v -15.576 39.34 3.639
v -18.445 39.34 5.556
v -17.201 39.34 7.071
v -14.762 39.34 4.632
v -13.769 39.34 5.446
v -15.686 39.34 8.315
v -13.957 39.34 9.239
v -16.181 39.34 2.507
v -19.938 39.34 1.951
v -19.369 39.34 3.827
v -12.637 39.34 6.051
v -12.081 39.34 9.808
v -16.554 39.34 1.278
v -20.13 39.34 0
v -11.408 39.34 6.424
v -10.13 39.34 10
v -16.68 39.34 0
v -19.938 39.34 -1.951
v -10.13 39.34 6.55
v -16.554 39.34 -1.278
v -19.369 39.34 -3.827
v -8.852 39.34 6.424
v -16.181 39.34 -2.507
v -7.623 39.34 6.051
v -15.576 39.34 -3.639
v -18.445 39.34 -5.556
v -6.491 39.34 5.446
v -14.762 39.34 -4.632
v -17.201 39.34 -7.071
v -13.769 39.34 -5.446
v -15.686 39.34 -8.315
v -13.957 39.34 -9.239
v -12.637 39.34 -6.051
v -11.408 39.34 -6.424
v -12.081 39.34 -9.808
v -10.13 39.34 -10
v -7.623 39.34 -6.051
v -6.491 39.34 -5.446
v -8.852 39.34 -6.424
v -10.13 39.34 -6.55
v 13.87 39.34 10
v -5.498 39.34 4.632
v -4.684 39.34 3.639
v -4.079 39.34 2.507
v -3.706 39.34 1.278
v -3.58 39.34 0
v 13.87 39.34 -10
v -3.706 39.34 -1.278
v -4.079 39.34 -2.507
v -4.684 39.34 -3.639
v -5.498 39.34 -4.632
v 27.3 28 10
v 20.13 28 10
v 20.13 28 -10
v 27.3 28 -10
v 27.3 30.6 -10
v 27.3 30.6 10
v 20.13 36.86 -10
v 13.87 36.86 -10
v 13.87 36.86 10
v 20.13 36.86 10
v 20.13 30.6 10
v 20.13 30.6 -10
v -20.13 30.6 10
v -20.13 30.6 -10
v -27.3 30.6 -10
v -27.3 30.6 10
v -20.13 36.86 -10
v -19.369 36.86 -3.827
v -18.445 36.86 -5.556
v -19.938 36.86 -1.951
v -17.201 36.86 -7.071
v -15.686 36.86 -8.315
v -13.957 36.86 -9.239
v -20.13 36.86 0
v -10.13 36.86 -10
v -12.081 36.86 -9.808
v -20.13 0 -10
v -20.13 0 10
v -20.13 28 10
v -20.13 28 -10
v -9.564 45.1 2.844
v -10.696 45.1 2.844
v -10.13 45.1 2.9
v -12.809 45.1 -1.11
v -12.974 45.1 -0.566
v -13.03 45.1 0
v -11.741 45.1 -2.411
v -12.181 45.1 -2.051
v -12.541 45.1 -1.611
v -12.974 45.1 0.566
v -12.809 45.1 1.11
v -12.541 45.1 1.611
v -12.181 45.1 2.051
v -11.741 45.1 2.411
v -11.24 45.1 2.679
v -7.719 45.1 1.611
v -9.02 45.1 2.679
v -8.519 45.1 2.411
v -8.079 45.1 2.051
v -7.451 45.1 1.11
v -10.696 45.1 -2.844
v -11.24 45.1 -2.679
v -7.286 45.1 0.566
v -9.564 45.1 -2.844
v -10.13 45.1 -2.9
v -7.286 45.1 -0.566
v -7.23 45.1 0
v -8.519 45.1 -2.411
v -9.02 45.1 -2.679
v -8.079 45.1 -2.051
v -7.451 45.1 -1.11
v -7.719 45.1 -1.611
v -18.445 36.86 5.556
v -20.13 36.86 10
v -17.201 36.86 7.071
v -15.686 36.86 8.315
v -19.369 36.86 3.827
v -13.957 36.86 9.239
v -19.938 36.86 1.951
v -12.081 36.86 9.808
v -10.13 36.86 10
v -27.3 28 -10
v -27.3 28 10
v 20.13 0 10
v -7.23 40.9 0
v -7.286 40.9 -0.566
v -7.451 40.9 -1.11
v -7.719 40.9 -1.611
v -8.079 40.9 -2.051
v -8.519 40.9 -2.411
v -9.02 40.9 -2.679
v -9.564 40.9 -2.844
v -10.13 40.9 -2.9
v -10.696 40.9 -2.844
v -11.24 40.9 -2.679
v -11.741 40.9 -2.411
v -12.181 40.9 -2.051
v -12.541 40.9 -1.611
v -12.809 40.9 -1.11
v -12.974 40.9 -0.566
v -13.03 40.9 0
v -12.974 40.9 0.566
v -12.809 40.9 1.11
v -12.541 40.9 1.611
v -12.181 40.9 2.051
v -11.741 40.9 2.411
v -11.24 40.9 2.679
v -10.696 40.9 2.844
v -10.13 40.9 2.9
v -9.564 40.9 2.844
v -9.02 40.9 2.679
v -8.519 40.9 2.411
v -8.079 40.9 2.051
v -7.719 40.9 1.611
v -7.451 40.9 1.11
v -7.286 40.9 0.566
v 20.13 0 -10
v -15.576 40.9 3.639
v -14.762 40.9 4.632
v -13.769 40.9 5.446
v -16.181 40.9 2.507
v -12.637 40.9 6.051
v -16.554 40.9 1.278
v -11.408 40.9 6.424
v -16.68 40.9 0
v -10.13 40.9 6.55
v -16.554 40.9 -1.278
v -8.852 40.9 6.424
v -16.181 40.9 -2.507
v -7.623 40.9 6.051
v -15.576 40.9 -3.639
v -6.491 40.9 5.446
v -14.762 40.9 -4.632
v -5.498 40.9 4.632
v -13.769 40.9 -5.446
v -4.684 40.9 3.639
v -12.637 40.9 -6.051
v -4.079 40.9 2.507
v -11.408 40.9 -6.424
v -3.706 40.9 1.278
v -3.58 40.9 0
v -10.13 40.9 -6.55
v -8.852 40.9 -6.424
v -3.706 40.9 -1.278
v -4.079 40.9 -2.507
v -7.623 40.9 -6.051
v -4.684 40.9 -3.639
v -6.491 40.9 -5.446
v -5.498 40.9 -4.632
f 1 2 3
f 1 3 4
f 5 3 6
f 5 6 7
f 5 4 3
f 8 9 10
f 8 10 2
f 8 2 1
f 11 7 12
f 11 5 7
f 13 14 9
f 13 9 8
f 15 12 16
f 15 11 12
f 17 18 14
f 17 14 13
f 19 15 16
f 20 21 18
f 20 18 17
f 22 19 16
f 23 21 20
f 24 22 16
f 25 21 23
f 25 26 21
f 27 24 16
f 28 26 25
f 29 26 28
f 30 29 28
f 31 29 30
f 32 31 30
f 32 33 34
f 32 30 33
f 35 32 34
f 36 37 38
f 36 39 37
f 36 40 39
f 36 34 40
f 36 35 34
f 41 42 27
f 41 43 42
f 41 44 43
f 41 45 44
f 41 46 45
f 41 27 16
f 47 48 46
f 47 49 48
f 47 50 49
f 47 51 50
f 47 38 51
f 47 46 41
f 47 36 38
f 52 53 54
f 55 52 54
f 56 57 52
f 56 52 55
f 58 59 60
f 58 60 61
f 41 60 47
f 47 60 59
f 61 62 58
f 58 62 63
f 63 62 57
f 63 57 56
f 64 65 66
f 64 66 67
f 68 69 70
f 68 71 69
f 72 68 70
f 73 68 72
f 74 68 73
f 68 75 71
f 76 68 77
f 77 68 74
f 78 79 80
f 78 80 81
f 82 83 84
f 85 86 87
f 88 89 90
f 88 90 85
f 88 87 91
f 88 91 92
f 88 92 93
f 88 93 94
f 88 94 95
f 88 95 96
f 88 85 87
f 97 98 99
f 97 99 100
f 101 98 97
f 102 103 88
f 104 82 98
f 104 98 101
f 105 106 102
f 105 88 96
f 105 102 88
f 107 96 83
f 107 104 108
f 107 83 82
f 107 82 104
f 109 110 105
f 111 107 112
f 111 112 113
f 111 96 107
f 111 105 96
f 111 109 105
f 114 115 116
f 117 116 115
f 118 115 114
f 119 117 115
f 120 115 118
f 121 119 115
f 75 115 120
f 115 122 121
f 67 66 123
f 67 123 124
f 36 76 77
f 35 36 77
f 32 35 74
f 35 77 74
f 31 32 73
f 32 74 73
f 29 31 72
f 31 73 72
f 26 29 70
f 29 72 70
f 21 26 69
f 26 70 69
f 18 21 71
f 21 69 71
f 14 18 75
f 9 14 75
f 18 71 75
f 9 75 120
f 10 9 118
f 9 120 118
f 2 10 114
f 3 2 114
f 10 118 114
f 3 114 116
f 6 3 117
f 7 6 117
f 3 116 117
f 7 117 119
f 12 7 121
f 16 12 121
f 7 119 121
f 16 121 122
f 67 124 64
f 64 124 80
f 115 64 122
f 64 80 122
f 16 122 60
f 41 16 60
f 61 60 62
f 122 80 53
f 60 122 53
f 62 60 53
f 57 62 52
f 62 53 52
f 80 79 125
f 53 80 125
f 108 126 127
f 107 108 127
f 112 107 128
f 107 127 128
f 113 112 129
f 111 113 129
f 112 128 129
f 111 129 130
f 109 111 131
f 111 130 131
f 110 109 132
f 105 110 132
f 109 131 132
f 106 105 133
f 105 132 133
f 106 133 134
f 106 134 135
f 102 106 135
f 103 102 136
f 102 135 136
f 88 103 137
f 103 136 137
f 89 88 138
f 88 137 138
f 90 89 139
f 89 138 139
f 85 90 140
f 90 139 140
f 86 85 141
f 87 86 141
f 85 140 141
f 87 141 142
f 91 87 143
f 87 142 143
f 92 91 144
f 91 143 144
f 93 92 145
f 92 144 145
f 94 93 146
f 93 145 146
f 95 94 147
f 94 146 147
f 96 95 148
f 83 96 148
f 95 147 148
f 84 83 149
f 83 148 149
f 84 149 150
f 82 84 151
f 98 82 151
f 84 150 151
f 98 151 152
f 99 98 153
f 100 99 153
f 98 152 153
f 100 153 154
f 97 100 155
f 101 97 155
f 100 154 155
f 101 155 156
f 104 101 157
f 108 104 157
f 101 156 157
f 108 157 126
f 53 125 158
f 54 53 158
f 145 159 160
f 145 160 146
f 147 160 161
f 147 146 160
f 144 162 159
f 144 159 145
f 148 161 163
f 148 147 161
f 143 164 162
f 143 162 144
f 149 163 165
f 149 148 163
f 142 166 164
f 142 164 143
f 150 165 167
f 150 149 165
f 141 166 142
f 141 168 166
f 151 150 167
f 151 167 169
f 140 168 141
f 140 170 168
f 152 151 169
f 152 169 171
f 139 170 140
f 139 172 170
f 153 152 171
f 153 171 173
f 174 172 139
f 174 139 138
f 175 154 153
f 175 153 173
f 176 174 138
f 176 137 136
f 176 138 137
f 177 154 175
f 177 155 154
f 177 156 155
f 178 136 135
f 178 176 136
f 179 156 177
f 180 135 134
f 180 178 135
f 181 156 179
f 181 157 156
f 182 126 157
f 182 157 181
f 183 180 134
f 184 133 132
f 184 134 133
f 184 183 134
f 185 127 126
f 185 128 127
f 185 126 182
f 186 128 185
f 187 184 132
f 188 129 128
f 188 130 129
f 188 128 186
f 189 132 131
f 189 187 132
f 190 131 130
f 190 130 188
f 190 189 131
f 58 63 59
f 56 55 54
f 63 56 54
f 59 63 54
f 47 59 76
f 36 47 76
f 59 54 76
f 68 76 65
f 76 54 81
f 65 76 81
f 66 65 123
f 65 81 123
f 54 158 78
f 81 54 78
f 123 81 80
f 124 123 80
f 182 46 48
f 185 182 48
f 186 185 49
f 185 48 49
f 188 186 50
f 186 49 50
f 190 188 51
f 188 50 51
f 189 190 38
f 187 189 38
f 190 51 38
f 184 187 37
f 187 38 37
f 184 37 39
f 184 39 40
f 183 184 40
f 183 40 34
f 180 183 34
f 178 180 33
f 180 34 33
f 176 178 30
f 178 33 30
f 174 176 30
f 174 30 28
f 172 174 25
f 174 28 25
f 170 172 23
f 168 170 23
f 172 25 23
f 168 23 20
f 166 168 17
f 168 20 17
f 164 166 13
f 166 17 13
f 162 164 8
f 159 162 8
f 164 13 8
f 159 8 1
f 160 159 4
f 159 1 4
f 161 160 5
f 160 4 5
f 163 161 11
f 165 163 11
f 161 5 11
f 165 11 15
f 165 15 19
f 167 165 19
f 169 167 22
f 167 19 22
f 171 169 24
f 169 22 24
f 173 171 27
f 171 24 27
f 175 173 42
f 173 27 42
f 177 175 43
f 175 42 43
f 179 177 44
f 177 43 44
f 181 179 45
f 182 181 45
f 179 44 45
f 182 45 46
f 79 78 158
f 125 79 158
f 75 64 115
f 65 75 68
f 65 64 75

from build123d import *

# Parameters (mm, degrees)
SKETCH1_W           = 40.26
SKETCH1_H           = 20
BOSS_EXTRUDE1_DEPTH = 36.86
SKETCH2_W           = 20
SKETCH2_H           = 2.6
BOSS_EXTRUDE2_DEPTH = 7.17
SKETCH3_W           = 20
SKETCH3_H           = 2.6
BOSS_EXTRUDE3_DEPTH = 7.17
SKETCH4_R           = 10
BOSS_EXTRUDE4_DEPTH = 2.48
SKETCH5_R           = 6.55
BOSS_EXTRUDE5_DEPTH = 1.56
SKETCH6_R           = 2.9
BOSS_EXTRUDE6_DEPTH = 4.2


with BuildPart() as part:
    # Sketch1 → Boss-Extrude1 (new body)
    with BuildSketch(Plane(origin=(0, 0, 0), x_dir=(1, 0, 0), z_dir=(0, 1, 0))):
        Rectangle(SKETCH1_W, SKETCH1_H)
    extrude(amount=BOSS_EXTRUDE1_DEPTH)

    # Sketch2 → Boss-Extrude2 (add)
    with BuildSketch(Plane(origin=(20.13, 0, 0), x_dir=(0, 0, -1), z_dir=(1, 0, 0))):
        with Locations((0, 29.3)):
            Rectangle(SKETCH2_W, SKETCH2_H)
    extrude(amount=BOSS_EXTRUDE2_DEPTH)

    # Sketch3 → Boss-Extrude3 (add)
    with BuildSketch(Plane.ZY.offset(20.13)):
        with Locations((0, 29.3)):
            Rectangle(SKETCH3_W, SKETCH3_H)
    extrude(amount=BOSS_EXTRUDE3_DEPTH)

    # Sketch4 → Boss-Extrude4 (add)
    with BuildSketch(Plane(origin=(0, 36.86, 0), x_dir=(1, 0, 0), z_dir=(0, 1, 0))):
        with Locations((-10.13, 0)):
            Circle(SKETCH4_R)
        with BuildLine():
            Line((13.87, 10), (-10.13, 10))
            ThreePointArc((-10.13, 10), (-3.058932188, 7.071067812), (-0.13, 0))
            ThreePointArc((-0.13, 0), (-3.058932188, -7.071067812), (-10.13, -10))
            Line((-10.13, -10), (13.87, -10))
            Line((13.87, -10), (13.87, 10))
        make_face()
    extrude(amount=BOSS_EXTRUDE4_DEPTH)

    # Sketch5 → Boss-Extrude5 (add)
    with BuildSketch(Plane(origin=(0, 39.34, 0), x_dir=(1, 0, 0), z_dir=(0, 1, 0))):
        with Locations((-10.13, 0)):
            Circle(SKETCH5_R)
    extrude(amount=BOSS_EXTRUDE5_DEPTH)

    # Sketch6 → Boss-Extrude6 (add)
    with BuildSketch(Plane(origin=(0, 40.9, 0), x_dir=(1, 0, 0), z_dir=(0, 1, 0))):
        with Locations((-10.13, 0)):
            Circle(SKETCH6_R)
    extrude(amount=BOSS_EXTRUDE6_DEPTH)


solid = part.part
